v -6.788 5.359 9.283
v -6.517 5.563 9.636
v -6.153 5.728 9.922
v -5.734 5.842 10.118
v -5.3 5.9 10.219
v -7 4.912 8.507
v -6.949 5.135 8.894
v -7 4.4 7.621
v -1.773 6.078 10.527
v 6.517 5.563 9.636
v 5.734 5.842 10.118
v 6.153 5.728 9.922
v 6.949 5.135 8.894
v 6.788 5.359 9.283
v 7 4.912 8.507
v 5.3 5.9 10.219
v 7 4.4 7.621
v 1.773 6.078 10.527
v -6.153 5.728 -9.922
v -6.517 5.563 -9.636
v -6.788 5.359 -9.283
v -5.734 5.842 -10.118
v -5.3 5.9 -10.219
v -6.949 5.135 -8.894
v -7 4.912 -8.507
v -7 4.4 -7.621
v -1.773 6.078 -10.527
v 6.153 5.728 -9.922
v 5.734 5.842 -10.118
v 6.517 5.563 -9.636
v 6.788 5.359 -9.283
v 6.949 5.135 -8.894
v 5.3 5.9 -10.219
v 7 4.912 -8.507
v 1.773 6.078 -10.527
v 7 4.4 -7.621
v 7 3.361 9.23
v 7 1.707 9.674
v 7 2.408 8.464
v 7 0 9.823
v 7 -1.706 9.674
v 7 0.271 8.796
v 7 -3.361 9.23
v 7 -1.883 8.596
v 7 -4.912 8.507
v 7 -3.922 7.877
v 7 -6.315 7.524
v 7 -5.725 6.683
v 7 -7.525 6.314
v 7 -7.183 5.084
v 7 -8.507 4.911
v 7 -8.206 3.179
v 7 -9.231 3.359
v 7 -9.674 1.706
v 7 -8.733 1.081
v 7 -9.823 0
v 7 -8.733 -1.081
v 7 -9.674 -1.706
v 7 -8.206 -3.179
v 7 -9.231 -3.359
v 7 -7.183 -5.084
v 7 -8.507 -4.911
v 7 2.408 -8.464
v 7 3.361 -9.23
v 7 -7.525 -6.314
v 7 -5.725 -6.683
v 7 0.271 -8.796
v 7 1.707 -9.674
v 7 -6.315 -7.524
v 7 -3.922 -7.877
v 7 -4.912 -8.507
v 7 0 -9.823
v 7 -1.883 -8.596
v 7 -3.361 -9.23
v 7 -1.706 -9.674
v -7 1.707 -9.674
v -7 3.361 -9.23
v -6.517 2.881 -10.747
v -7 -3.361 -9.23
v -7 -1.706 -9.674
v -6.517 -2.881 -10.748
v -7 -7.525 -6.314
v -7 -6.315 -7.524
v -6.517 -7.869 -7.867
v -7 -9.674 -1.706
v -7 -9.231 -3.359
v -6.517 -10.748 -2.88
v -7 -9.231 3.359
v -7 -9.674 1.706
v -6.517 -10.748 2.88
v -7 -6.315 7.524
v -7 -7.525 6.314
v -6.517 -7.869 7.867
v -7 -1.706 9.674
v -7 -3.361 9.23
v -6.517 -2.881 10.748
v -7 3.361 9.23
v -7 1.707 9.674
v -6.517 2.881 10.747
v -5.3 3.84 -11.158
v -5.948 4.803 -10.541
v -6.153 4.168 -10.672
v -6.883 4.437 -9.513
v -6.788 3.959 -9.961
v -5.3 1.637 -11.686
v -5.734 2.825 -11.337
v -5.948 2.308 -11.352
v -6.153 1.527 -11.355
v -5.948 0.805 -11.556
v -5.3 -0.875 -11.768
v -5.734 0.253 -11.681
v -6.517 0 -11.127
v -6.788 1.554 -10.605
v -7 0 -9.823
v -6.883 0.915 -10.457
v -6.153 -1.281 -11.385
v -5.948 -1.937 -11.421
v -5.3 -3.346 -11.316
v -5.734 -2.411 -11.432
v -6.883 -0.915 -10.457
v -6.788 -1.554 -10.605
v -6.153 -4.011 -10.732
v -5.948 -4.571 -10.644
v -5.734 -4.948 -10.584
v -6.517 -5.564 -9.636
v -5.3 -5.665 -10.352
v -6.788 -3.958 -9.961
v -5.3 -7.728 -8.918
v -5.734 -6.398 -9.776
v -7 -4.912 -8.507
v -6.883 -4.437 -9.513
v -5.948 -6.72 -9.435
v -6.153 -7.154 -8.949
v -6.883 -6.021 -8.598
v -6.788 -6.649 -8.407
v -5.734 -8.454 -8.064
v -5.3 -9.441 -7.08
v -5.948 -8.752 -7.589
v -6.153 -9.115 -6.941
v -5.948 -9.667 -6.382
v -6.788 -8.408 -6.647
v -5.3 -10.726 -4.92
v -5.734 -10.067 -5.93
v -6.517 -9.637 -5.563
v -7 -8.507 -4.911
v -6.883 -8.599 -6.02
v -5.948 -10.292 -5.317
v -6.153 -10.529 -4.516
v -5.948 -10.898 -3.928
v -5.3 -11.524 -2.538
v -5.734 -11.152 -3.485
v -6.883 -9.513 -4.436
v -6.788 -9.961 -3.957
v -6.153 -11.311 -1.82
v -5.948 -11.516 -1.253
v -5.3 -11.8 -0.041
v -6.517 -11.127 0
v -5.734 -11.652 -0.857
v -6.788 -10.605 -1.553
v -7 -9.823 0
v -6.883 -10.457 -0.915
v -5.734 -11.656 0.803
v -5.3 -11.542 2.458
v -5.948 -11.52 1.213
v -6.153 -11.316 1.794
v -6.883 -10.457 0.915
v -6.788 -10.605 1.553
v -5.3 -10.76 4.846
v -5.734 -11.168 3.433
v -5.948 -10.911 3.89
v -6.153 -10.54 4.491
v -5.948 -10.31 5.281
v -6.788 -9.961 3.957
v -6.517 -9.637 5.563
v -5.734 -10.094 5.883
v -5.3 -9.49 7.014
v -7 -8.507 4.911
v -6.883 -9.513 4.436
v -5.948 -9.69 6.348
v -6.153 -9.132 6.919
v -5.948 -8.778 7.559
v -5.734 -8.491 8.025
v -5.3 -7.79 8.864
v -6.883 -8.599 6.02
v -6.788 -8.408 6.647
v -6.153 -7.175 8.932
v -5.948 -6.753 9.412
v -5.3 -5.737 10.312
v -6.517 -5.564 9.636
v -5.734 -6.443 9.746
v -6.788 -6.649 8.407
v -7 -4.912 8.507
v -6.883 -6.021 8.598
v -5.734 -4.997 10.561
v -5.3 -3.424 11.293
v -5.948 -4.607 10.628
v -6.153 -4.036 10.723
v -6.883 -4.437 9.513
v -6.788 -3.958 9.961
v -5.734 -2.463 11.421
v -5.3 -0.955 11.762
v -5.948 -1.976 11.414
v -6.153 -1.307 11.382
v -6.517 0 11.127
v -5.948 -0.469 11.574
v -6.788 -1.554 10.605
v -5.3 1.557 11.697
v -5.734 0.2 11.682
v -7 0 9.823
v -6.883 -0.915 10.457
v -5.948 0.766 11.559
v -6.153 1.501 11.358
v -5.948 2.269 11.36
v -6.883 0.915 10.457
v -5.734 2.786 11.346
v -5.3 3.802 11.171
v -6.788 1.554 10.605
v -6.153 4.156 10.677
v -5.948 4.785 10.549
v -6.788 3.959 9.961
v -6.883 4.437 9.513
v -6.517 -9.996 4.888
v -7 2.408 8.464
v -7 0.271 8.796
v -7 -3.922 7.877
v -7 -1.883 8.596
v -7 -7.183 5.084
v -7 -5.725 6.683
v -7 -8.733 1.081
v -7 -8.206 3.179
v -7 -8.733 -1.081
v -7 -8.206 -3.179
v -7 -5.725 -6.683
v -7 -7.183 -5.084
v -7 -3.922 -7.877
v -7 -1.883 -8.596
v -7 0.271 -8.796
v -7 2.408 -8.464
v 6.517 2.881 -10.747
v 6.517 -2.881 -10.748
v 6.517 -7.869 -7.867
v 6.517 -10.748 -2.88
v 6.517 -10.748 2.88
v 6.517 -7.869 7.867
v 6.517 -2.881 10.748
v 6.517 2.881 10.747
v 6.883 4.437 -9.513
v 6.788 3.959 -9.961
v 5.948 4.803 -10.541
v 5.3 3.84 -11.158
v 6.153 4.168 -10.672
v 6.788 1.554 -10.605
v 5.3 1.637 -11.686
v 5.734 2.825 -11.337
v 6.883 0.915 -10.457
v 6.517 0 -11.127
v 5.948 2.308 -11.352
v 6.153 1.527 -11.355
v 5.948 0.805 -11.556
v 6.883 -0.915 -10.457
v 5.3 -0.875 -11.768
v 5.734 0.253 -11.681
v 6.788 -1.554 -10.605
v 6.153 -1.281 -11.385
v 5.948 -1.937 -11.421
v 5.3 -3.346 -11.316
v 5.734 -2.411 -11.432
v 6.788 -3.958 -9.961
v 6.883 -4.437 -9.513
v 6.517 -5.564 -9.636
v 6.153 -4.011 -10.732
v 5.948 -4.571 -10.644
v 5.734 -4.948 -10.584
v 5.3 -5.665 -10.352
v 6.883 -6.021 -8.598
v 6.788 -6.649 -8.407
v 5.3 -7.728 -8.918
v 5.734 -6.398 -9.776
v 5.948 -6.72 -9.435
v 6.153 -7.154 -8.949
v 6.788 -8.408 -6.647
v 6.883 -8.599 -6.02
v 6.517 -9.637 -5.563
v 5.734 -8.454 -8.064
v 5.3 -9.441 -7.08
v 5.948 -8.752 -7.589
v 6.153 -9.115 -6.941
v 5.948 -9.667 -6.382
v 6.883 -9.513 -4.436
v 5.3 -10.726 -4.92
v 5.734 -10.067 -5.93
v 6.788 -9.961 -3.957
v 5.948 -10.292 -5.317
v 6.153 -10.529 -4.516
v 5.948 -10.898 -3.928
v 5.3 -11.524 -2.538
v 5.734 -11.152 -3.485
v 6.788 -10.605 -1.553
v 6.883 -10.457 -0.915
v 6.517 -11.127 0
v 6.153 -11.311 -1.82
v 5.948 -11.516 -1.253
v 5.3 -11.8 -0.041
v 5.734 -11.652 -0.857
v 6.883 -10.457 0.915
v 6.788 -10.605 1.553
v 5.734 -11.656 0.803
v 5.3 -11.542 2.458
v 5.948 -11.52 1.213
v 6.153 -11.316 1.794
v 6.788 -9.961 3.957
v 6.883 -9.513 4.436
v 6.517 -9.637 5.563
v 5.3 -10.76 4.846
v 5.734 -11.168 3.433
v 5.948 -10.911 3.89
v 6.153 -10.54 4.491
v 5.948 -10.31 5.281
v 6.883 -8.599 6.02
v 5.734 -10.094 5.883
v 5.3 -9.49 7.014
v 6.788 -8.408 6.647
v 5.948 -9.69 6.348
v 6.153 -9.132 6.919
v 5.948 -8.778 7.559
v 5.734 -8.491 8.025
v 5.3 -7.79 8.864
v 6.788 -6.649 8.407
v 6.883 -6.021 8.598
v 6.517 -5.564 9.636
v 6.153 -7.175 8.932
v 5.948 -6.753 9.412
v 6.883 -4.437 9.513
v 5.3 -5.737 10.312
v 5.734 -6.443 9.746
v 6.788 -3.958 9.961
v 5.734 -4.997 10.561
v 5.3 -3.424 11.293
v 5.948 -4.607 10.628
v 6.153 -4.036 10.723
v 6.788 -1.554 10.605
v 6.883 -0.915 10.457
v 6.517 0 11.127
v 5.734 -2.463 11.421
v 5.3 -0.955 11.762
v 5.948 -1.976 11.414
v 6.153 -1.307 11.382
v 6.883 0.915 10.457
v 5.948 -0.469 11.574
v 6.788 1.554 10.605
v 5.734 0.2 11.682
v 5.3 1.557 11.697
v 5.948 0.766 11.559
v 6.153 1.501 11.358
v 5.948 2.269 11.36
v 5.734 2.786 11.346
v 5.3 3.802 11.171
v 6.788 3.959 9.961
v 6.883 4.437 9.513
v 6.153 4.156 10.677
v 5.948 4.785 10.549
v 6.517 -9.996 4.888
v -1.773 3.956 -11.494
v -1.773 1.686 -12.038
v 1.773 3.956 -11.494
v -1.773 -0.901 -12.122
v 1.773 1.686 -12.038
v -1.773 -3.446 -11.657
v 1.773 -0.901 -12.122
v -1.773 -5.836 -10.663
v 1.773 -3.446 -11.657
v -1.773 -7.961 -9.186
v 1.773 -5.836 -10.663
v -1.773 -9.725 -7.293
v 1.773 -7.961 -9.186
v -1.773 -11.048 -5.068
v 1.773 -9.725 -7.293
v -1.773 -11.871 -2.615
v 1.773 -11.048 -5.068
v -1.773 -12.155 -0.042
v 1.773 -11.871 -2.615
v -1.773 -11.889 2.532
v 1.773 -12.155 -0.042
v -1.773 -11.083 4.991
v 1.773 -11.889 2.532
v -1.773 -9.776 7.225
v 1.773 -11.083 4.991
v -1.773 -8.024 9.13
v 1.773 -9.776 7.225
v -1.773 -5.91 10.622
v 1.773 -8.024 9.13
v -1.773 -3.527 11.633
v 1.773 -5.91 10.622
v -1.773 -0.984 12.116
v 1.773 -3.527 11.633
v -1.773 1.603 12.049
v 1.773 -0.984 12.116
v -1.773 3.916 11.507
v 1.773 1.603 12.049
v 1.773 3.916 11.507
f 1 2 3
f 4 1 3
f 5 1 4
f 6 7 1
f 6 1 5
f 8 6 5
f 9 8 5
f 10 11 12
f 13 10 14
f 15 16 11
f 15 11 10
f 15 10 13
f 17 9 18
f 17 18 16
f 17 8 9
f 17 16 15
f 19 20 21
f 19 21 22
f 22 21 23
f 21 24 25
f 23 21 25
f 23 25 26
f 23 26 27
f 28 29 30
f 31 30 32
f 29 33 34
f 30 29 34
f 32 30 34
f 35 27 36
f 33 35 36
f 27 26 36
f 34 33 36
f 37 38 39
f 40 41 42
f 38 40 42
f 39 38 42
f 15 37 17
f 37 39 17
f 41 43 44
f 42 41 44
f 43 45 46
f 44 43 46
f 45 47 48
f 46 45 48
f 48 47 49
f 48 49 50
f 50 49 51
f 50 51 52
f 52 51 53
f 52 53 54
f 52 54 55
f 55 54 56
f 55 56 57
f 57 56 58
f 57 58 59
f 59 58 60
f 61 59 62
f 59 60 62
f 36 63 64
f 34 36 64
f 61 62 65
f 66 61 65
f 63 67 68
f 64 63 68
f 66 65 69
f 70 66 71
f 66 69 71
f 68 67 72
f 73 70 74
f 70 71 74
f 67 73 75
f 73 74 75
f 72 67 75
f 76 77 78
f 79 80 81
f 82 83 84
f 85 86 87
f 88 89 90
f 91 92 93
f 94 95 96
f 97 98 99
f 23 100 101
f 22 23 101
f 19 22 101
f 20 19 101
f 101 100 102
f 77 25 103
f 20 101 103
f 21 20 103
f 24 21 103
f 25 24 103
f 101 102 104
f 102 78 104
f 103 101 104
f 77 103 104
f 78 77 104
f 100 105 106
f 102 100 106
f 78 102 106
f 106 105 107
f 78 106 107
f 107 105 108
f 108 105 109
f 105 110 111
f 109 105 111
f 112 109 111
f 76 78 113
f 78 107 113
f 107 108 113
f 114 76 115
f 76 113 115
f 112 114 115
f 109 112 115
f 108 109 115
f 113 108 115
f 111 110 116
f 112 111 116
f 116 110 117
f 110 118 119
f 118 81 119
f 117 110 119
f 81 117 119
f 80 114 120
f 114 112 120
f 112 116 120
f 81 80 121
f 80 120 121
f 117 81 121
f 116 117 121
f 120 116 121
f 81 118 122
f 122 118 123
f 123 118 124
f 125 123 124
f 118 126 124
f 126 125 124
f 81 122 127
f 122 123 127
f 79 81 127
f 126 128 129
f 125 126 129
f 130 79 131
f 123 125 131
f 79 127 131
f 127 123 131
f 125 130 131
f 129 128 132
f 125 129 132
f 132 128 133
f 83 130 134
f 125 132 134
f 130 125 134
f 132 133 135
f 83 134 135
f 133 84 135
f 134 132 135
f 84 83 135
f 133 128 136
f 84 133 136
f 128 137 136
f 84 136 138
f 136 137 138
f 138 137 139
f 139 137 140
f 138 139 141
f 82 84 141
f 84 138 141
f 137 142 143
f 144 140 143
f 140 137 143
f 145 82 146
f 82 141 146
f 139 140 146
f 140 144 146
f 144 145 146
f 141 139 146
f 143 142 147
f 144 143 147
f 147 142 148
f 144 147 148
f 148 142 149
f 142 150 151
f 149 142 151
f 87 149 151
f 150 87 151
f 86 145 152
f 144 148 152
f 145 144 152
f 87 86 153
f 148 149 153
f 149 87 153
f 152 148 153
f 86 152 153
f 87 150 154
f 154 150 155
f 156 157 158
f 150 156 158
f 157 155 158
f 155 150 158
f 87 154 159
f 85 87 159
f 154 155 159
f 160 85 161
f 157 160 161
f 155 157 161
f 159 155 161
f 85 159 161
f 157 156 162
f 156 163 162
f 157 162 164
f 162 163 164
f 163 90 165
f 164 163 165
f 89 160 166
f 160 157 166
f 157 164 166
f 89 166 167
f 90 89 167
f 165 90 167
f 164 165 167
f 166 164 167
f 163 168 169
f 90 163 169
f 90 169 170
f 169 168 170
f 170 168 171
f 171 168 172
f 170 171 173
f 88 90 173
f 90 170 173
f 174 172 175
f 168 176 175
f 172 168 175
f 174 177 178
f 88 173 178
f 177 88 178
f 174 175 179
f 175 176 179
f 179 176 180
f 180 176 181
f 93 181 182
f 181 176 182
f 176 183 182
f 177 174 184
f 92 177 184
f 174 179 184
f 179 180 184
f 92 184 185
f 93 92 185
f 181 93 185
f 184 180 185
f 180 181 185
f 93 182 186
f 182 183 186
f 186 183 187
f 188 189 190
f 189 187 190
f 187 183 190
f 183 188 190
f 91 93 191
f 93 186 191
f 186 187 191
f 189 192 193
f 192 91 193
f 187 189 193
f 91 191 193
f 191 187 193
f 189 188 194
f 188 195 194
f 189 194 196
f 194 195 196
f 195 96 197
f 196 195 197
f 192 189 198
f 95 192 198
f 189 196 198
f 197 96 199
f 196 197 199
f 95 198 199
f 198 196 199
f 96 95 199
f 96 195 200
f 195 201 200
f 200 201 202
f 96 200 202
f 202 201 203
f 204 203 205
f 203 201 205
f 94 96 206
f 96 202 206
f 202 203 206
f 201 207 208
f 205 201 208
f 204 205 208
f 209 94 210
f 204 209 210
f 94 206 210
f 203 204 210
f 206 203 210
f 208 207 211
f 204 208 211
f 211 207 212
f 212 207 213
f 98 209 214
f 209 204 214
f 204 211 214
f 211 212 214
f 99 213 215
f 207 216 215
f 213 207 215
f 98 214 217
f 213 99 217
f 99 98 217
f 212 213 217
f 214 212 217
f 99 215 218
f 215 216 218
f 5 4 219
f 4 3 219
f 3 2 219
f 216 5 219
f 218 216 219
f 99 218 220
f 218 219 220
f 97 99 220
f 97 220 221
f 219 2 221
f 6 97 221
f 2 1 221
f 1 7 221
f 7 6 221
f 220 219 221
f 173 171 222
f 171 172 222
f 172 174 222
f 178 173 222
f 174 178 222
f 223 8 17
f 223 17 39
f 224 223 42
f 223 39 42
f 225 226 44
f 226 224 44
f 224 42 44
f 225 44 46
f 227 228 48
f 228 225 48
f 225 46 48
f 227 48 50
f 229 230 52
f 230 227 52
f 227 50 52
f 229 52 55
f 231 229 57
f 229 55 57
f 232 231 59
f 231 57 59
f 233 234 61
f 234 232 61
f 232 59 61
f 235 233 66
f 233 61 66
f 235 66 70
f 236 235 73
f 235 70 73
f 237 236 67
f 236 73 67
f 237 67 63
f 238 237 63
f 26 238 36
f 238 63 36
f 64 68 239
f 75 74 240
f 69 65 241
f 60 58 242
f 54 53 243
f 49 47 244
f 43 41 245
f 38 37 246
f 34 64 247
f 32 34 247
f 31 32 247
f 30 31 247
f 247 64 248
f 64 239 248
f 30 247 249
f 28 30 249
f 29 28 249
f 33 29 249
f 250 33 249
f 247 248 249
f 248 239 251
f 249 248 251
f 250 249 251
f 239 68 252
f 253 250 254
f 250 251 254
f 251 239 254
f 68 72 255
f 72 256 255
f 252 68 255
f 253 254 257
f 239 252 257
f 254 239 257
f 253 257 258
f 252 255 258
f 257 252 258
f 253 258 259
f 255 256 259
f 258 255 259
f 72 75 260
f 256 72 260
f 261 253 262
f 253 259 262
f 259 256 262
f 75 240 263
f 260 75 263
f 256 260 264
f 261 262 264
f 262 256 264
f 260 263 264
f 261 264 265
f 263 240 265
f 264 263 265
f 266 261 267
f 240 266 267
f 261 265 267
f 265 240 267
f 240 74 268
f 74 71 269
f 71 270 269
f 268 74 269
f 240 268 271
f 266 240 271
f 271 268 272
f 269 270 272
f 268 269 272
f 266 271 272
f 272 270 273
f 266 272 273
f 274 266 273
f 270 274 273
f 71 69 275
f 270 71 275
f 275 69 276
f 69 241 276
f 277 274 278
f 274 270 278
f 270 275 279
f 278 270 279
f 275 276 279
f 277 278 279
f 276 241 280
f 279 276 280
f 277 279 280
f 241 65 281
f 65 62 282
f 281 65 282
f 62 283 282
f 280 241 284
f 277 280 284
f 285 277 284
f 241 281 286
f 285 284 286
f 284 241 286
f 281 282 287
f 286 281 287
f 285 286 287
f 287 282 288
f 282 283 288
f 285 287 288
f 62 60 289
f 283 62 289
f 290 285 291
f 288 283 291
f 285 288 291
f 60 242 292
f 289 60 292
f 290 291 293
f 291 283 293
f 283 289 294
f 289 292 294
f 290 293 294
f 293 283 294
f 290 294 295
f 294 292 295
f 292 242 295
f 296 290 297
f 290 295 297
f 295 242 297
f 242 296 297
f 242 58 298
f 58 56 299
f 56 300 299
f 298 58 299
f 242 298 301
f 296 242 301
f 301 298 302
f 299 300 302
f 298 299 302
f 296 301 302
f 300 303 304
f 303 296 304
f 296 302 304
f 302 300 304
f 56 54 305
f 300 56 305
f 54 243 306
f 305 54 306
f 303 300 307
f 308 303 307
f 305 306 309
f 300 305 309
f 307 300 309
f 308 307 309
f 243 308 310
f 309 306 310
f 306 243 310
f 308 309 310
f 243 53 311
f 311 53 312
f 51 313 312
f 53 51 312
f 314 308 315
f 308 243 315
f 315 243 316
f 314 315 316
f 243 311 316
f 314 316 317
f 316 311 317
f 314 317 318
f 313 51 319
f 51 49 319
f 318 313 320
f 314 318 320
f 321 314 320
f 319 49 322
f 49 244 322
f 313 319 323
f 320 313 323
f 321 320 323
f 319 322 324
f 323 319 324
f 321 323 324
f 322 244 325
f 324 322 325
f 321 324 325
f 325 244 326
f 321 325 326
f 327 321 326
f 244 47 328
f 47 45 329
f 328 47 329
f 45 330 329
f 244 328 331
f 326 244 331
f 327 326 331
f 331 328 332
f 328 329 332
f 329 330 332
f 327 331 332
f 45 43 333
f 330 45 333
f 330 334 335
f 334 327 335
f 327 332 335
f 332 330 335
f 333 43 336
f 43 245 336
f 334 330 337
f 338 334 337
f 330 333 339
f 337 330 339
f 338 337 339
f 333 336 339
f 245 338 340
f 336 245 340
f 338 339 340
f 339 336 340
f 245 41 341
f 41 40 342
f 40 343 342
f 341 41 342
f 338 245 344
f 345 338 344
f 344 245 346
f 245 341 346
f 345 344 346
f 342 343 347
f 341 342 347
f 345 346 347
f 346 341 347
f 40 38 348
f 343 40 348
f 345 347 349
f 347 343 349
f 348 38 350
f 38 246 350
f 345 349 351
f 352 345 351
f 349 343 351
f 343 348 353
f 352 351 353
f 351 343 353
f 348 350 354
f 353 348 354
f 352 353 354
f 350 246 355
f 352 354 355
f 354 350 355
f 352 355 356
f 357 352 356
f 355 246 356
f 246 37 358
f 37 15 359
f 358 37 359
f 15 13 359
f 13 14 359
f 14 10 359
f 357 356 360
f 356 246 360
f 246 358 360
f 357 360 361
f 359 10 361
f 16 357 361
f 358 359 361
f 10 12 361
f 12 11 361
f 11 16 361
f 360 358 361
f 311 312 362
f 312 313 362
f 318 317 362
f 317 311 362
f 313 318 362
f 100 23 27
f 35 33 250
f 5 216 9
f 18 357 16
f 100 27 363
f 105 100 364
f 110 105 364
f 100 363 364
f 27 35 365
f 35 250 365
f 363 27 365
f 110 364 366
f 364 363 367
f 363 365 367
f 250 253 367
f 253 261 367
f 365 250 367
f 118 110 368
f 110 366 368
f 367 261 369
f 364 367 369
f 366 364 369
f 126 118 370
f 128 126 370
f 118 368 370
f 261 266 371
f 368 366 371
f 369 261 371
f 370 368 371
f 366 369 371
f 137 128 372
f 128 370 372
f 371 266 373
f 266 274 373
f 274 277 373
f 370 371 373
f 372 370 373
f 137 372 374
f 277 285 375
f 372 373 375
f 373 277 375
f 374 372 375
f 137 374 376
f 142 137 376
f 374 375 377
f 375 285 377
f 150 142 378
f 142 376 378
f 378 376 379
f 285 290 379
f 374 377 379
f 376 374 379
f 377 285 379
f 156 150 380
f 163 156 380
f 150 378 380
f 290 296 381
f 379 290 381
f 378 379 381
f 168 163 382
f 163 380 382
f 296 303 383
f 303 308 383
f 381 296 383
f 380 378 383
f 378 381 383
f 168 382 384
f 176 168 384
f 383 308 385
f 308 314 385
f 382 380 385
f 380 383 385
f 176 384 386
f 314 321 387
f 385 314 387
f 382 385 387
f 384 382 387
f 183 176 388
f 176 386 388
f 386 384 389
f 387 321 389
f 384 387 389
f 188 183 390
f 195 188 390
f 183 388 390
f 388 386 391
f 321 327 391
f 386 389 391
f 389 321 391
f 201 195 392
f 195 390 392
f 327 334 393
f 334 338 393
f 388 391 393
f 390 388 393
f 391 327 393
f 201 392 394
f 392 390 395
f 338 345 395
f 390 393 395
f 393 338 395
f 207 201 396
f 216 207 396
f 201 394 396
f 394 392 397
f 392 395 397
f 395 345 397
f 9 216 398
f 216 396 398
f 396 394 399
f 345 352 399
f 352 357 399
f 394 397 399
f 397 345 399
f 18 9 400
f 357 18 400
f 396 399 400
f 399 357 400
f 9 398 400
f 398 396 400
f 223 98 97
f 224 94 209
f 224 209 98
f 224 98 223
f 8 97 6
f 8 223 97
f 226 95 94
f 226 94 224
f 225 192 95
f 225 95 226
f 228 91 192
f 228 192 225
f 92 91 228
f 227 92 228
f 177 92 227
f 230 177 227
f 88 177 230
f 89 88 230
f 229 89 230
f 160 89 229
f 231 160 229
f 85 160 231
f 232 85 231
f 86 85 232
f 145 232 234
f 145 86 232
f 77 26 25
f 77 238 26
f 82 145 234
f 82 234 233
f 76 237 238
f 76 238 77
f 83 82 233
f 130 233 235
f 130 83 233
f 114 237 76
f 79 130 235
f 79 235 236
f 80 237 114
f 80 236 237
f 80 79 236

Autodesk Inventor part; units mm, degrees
ref_plane "YZ Plane" through (0, 0, 0) normal (1, 0, 0) x (0, 1, 0)
ref_plane "XZ Plane" through (0, 0, 0) normal (0, 1, 0) x (-1, 0, 0)
ref_plane "XY Plane" through (0, 0, 0) normal (0, 0, 1) x (1, 0, 0)
sketch "スケッチ1" plane through (0, 0, 0) normal (0, 0, 1) x (1, 0, 0)
  line L0 (0, 0) -> (23.2776, 0) construction
  line L1 (-7, -8.8) -> (7, -8.8)
  line L2 (7, -8.8) -> (7, -11.5)
  line L3 (7, -11.5) -> (-7, -11.5) construction
  line L4 (-7, -11.5) -> (-7, -8.8)
  line L5 (0, 0) -> (0, -16.4759) construction
  arc A0 (-7, -11.5) -> (7, -11.5) centre (0, 23.15) ccw
  line L6 (0, -12.2) -> (12.7013, -12.2) construction
  line L7 (0, 0) -> (-18.8146, 0) construction
  dimension "d0" = 14
  dimension "d1" = 8.8
  dimension "d2" = 12.2
  dimension "d4" = 11.5
revolve "回転1" add sketch "スケッチ1" angle 240 mid plane about axis through (0, 0, 0) along (-1, 0, 0)
fillet "フィレット1" radius 2 2 edges at (7, -11.5, 0) (-7, -11.5, 0)
properties part number "11_027_SHOE_GRIP_RUBBER_R1" material "ゴム、シリコーン"
